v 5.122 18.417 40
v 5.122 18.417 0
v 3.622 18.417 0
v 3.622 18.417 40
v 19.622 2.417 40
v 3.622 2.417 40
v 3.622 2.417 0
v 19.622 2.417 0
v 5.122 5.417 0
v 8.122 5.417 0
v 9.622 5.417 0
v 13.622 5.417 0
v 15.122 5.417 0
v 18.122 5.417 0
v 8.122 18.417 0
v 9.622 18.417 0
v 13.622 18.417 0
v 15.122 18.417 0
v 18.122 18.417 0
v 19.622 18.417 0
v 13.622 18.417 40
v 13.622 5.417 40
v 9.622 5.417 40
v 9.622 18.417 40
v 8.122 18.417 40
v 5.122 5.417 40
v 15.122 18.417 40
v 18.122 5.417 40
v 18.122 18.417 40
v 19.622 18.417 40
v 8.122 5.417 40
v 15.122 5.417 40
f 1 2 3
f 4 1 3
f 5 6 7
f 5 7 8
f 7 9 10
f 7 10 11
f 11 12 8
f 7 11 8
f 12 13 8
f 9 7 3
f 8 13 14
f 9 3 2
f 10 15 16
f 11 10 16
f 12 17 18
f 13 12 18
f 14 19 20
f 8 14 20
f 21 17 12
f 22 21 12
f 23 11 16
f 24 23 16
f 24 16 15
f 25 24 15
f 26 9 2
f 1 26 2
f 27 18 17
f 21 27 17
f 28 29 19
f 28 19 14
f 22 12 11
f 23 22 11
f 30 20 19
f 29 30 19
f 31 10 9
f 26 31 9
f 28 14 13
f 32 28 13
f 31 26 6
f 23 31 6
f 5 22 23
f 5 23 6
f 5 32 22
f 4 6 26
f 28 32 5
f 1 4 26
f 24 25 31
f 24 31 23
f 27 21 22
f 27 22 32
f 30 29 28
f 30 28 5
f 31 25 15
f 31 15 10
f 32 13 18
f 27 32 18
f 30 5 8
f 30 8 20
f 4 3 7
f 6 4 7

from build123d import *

# Parameters (mm, degrees)
EXTRUDE_DEPTH                     = 40
EXTRUDE_ONTO_WIRE_PLACEMENT_ANGLE = -3e-06


with BuildPart() as part:
    # Wire as drawn → Extrude (new)
    with BuildSketch(Plane.XY):
        Polygon((0, 0), (16, 0), (16, 16), (14.5, 16), (14.5, 3), (11.5, 3), (11.5, 16), (10, 16), (10, 3), (6, 3), (6, 16), (4.5, 16), (4.5, 3), (1.5, 3), (1.5, 16), (0, 16), align=None)
    extrude(amount=EXTRUDE_DEPTH)


with BuildPart() as part_1:
    # Extrude onto Wire placement: moved
    add(part.part.moved(Location((3.622236, 2.417496, 0))).rotate(Axis((3.622236, 2.417496, 0), (0, 0, 1)), EXTRUDE_ONTO_WIRE_PLACEMENT_ANGLE))


solid = part_1.part
